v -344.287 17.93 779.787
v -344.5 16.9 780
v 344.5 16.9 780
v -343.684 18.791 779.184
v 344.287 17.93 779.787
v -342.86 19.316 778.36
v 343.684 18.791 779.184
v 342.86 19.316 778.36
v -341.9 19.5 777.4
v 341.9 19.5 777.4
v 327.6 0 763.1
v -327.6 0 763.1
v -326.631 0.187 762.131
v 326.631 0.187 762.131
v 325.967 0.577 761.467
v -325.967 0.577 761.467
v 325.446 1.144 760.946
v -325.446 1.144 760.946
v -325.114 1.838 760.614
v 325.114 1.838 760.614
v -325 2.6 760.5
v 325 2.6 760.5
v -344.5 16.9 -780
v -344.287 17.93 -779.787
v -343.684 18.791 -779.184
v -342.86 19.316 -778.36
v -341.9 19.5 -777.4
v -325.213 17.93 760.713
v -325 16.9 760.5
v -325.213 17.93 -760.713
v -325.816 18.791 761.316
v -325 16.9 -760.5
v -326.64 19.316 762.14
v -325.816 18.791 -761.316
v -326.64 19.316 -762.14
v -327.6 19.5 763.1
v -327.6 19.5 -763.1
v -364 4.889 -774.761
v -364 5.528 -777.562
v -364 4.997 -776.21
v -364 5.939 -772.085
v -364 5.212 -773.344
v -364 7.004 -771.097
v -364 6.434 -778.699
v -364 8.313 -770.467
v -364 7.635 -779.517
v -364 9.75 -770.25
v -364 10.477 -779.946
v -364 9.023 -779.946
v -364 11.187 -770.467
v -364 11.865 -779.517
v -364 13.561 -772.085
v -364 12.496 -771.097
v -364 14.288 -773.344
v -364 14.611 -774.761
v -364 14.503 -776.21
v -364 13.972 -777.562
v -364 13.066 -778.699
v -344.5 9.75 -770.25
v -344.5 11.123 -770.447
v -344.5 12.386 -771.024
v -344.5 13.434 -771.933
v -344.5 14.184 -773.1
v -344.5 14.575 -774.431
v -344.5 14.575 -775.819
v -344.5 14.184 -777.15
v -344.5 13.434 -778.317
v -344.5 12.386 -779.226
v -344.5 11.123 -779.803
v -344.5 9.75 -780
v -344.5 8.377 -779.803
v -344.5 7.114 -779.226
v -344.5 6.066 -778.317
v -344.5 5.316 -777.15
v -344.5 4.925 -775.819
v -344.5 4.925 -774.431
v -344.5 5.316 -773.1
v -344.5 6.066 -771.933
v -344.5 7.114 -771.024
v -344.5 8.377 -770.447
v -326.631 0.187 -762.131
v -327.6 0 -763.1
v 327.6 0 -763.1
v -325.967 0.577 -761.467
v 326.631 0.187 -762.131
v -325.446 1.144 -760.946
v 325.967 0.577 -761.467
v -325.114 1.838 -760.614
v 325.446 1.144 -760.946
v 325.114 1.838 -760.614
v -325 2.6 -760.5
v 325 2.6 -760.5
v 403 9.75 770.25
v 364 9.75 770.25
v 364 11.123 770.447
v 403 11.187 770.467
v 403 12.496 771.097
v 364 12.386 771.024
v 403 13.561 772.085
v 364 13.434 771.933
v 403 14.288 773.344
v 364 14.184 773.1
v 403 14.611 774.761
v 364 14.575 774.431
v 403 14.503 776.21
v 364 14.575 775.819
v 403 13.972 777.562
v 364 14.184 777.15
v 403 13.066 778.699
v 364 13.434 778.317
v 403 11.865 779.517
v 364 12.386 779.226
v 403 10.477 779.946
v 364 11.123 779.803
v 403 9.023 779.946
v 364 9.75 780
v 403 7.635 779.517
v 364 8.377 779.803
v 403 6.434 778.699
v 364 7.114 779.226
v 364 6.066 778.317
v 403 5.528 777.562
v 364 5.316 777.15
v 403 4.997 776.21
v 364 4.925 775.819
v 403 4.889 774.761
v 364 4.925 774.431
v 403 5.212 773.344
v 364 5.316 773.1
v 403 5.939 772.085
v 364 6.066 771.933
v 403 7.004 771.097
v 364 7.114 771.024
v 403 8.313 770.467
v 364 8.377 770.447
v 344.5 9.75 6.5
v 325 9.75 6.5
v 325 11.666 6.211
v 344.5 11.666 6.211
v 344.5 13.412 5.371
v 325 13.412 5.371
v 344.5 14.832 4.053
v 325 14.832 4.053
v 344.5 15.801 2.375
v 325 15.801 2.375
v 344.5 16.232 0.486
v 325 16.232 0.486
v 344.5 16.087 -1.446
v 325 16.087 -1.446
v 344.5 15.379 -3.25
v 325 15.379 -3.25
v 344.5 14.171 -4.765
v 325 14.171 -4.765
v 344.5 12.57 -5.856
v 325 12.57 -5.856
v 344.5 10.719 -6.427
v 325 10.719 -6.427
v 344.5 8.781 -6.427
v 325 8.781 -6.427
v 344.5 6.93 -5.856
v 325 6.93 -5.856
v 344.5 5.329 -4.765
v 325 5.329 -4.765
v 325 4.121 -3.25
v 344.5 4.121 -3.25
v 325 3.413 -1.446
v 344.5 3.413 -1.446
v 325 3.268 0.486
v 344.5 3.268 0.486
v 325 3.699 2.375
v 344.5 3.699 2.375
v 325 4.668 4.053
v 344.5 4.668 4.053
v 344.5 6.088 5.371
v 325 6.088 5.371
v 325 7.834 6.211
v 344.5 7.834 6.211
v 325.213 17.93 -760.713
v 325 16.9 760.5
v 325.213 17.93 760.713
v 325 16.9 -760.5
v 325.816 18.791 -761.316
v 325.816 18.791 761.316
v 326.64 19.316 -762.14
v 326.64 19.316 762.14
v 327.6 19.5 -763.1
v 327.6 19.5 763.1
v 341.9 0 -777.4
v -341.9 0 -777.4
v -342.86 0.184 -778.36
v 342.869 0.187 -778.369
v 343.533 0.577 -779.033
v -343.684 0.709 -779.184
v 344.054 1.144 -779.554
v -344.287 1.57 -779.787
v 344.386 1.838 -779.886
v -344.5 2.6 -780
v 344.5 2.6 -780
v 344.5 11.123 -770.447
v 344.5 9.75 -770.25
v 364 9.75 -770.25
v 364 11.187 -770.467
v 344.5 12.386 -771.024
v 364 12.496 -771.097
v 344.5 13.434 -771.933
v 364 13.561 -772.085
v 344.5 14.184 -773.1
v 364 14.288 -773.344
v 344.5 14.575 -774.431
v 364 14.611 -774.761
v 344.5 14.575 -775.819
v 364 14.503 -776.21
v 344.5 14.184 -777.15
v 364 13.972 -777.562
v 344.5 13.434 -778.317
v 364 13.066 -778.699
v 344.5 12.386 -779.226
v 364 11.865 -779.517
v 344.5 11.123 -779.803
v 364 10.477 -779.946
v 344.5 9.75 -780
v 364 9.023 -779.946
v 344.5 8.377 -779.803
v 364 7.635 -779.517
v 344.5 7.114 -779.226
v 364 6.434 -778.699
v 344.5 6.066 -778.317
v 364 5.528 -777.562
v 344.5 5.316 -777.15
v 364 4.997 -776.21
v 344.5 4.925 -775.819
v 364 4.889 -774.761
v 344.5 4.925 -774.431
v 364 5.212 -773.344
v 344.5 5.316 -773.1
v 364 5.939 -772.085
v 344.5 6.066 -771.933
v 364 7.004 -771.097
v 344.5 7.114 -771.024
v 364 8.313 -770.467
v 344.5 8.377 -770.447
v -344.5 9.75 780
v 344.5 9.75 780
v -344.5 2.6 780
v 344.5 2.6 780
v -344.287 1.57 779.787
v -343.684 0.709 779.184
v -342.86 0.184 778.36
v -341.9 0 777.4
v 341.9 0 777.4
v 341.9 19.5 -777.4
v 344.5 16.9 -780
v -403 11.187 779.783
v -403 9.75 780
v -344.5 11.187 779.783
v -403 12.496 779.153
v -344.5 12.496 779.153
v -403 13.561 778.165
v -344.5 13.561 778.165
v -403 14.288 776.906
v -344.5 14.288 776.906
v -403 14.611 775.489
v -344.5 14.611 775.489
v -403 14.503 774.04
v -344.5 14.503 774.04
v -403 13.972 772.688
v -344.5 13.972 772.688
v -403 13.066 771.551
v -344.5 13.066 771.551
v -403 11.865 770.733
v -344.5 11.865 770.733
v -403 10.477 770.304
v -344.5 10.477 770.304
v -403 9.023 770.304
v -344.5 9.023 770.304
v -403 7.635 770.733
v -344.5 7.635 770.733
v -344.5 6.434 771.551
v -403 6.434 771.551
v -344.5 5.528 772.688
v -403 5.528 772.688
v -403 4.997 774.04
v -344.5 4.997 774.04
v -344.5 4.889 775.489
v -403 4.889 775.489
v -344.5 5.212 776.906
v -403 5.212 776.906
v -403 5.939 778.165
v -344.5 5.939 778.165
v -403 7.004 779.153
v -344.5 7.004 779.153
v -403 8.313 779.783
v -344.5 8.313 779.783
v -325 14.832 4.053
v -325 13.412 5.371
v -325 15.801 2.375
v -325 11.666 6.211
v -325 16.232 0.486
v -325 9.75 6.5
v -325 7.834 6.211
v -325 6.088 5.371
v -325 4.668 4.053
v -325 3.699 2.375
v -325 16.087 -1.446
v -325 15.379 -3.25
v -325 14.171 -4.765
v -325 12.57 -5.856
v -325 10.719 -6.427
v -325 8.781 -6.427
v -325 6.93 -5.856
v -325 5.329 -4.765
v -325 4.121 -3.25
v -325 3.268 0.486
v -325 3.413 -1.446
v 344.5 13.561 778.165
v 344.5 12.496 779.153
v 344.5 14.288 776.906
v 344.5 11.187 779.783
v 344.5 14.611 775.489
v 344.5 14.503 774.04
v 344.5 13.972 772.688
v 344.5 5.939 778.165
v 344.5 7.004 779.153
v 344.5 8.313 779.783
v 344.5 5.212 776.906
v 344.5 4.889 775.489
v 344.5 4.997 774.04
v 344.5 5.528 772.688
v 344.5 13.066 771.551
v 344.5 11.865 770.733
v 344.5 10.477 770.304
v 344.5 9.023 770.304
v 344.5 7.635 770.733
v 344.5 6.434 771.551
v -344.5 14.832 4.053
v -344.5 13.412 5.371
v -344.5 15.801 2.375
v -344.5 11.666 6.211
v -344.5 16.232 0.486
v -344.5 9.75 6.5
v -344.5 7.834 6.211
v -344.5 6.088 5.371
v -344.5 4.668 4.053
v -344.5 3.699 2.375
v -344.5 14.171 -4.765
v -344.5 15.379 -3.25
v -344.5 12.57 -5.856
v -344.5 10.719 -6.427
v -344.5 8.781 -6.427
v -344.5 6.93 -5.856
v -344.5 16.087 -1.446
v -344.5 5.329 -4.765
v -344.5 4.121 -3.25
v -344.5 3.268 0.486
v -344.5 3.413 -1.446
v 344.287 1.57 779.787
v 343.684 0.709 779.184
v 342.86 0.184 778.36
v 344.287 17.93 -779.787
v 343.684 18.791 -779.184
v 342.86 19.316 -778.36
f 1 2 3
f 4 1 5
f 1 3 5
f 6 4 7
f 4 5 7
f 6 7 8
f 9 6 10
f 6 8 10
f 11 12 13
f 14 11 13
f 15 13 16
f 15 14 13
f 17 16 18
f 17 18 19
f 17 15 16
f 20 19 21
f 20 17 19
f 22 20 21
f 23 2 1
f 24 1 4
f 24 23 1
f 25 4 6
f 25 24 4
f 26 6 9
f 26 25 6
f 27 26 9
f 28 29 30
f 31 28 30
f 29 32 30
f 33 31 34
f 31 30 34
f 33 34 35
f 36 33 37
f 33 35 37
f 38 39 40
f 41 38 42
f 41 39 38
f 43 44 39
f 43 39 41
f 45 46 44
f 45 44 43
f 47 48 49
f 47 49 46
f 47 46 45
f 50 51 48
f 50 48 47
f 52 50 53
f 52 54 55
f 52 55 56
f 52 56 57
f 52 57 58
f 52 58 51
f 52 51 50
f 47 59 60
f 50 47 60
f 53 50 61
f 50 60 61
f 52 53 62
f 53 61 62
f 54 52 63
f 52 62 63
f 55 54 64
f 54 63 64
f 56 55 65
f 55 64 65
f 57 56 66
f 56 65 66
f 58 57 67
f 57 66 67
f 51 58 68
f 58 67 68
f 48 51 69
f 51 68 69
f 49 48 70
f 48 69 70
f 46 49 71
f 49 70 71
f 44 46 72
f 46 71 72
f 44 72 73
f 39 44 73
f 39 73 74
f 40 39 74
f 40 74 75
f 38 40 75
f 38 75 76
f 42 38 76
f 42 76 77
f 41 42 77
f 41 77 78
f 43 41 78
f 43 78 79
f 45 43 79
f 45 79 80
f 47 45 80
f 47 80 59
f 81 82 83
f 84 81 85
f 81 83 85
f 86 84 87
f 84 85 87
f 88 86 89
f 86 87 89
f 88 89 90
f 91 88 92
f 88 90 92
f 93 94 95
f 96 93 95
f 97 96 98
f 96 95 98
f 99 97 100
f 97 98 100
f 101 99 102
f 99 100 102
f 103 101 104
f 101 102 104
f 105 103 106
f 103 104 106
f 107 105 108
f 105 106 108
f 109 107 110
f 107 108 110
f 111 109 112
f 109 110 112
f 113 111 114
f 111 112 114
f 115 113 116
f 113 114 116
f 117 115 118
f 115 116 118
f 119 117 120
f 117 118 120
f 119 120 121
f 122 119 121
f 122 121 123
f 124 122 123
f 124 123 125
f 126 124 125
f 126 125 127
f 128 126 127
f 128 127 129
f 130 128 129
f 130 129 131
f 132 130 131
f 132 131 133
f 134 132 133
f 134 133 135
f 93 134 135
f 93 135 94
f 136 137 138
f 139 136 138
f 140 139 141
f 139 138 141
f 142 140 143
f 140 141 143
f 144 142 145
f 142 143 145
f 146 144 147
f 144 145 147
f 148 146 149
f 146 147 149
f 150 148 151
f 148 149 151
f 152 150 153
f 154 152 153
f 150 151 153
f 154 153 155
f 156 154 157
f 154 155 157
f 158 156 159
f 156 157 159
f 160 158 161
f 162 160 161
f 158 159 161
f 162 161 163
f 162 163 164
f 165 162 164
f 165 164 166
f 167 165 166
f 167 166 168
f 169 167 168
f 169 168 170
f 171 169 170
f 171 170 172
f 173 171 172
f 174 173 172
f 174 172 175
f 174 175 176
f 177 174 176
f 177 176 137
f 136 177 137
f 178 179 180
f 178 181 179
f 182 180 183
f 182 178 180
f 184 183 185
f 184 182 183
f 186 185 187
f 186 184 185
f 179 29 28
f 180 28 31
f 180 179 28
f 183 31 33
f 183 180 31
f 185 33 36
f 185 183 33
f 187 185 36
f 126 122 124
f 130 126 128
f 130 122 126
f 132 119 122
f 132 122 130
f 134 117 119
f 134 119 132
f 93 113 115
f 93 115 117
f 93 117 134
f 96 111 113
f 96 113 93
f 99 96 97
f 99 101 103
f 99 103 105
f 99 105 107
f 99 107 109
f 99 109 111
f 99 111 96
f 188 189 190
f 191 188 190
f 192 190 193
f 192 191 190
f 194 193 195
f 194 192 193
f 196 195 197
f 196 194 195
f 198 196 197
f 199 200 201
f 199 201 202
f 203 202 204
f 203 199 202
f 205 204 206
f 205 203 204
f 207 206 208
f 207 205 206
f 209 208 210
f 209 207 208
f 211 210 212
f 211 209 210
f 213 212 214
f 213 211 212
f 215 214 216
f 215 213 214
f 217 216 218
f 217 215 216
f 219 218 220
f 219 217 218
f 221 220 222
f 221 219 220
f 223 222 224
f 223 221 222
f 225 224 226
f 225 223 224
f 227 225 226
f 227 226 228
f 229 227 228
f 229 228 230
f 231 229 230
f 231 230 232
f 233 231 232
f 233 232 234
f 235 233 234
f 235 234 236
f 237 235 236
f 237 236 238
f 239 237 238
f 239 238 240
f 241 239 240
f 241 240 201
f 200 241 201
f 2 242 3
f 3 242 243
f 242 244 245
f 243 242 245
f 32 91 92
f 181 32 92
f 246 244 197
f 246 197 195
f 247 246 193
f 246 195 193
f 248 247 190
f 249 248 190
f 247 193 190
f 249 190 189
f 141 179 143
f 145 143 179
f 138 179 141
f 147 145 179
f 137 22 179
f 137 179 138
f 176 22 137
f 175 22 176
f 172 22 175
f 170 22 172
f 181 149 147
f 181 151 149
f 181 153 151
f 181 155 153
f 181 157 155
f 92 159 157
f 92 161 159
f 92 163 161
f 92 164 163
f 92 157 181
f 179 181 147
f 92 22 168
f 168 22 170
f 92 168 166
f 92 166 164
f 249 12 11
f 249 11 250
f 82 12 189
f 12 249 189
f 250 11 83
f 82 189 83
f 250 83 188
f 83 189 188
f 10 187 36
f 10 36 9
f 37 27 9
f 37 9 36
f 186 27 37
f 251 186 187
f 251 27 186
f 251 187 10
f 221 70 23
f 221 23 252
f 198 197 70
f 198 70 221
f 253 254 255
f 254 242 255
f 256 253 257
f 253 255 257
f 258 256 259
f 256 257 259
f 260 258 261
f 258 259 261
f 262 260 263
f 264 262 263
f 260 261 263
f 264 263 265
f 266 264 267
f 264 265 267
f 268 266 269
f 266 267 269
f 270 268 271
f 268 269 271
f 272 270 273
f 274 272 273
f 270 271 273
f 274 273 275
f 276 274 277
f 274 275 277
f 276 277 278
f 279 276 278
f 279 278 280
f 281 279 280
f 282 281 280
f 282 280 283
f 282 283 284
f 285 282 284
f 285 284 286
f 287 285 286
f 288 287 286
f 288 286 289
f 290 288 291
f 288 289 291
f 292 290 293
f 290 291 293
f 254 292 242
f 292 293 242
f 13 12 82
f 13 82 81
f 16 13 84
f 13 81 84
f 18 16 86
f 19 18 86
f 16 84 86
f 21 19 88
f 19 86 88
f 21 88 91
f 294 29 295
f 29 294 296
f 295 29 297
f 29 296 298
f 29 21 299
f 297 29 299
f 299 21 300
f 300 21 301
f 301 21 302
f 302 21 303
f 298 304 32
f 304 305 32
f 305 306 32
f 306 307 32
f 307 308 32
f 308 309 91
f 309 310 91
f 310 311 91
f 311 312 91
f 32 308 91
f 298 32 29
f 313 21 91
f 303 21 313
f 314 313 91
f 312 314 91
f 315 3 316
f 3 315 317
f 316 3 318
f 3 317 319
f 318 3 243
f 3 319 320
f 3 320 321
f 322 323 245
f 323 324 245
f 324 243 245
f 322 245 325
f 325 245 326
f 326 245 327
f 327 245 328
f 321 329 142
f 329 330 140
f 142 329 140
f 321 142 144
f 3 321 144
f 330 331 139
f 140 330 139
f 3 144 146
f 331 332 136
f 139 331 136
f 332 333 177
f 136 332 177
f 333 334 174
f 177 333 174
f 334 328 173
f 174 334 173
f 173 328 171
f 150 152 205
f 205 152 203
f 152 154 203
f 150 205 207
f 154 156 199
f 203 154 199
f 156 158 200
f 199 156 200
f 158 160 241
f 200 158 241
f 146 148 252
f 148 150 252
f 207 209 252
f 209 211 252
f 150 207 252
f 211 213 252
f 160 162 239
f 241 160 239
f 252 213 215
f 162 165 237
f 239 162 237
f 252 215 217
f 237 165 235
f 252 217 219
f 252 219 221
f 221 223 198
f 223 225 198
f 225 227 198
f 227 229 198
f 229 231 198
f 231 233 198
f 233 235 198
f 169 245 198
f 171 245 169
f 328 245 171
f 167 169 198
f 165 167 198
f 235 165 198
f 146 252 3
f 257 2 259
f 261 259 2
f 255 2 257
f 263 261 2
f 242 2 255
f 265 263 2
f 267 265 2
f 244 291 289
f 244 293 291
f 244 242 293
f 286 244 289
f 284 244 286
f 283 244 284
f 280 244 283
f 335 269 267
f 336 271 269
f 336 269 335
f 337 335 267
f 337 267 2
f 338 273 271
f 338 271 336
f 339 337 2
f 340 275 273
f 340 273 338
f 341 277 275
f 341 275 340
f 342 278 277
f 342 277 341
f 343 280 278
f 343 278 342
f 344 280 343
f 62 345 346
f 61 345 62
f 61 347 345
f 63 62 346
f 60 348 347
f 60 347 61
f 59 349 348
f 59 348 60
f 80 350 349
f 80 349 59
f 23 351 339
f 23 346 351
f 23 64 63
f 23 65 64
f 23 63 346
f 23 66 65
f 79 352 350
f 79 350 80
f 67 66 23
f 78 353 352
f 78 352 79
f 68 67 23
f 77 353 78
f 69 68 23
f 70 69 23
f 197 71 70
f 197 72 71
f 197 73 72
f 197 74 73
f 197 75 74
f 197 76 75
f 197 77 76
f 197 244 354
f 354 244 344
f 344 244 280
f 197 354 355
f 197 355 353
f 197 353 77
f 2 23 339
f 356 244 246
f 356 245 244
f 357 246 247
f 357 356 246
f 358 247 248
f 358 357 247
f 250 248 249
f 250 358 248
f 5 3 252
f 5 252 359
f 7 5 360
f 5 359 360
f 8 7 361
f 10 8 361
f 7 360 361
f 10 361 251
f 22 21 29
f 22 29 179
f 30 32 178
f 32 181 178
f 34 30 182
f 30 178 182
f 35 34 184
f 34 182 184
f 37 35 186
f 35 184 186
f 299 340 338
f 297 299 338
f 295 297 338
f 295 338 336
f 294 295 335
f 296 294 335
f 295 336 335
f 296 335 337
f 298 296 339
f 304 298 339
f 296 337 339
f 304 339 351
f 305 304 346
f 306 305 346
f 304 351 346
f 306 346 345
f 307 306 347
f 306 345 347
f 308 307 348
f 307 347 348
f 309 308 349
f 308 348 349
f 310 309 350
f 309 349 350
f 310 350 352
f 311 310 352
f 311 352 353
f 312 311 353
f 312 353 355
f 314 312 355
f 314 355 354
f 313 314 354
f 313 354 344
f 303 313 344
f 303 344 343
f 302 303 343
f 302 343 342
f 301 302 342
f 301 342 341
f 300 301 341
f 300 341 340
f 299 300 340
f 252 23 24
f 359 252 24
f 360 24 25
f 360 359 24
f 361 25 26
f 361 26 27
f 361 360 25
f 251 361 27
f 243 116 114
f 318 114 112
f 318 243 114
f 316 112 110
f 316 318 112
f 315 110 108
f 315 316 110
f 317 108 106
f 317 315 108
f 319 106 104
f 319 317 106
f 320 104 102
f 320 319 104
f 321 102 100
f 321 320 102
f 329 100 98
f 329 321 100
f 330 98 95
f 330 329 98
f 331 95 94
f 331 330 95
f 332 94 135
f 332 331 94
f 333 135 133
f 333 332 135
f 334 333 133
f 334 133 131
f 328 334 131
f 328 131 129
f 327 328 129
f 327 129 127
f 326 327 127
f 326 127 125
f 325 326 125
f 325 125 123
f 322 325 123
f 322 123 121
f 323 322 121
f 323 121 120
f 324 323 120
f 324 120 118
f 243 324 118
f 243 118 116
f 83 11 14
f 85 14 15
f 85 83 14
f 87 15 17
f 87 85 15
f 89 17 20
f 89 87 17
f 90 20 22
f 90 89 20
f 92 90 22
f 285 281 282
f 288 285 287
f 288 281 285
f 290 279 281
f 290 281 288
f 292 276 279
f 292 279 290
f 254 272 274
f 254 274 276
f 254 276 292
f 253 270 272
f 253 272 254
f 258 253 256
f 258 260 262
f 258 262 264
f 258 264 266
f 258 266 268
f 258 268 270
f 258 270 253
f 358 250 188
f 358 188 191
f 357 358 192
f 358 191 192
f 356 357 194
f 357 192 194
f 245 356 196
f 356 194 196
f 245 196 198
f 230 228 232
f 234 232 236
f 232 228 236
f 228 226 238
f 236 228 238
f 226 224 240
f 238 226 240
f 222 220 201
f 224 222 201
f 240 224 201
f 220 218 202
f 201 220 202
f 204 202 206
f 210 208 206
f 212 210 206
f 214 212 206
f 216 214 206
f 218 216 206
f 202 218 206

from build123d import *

# Parameters (mm, degrees)
CROQUIS1_W              = 530
CROQUIS1_H              = 1200
CROQUIS1_W_2            = 500
CROQUIS1_H_2            = 1170
SALIENTE_EXTRUIR1_DEPTH = 15
REDONDEO1_R             = 2
REDONDEO2_R             = 2
CROQUIS2_R              = 3.75
SALIENTE_EXTRUIR2_DEPTH = 15
CROQUIS3_R              = 5
CORTAR_EXTRUIR1_DEPTH   = 546
CROQUIS4_R              = 3.75
SALIENTE_EXTRUIR3_DEPTH = 30
CROQUIS5_R              = 3.75
SALIENTE_EXTRUIR4_DEPTH = 30
ESCALA1_SCALE           = 1.3


with BuildPart() as part:
    # Croquis1 → Saliente-Extruir1 (new body)
    with BuildSketch(Plane(origin=(0, 0, 0), x_dir=(1, 0, 0), z_dir=(0, 1, 0))):
        Rectangle(CROQUIS1_W, CROQUIS1_H)
        Rectangle(CROQUIS1_W_2, CROQUIS1_H_2, mode=Mode.SUBTRACT)
    extrude(amount=SALIENTE_EXTRUIR1_DEPTH)

    # Redondeo1
    redondeo1_edges = [part.edges().sort_by_distance(p)[0] for p in [
        (-265, 15, 0),
        (250, 15, 0),
        (0, 15, 600),
        (0, 15, -585),
        (-250, 15, 0),
        (0, 15, 585),
        (265, 15, 0),
        (0, 15, -600),
    ]]
    fillet(redondeo1_edges, radius=REDONDEO1_R)

    # Redondeo2
    redondeo2_edges = [part.edges().sort_by_distance(p)[0] for p in [
        (250, 0, 0),
        (0, 0, -585),
        (-250, 0, 0),
        (0, 0, 585),
        (0, 0, 600),
        (-265, 0, 0),
        (0, 0, -600),
        (265, 0, 0),
    ]]
    fillet(redondeo2_edges, radius=REDONDEO2_R)

    # Croquis2 → Saliente-Extruir2 (add)
    with BuildSketch(Plane.ZY.offset(265)):
        with Locations((596.25, 7.5)):
            Circle(CROQUIS2_R)
        with Locations((-596.25, 7.5)):
            Circle(CROQUIS2_R)
    saliente_extruir2 = extrude(amount=SALIENTE_EXTRUIR2_DEPTH)

    # Simetría1: Saliente-Extruir2 across plane
    add(saliente_extruir2.mirror(Plane(origin=(0, 0, 0), x_dir=(0, 0, 1), z_dir=(1, 0, 0))))

    # Croquis3 → Cortar-Extruir1 (cut, through all)
    with BuildSketch(Plane.ZY.offset(265)):
        with Locations((0, 7.5)):
            Circle(CROQUIS3_R)
    extrude(amount=-CORTAR_EXTRUIR1_DEPTH, mode=Mode.SUBTRACT)

    # Croquis4 → Saliente-Extruir3 (add)
    with BuildSketch(Plane(origin=(280, 0, 0), x_dir=(0, 0, -1), z_dir=(1, 0, 0))):
        with Locations((-596.25, 7.5)):
            Circle(CROQUIS4_R)
    extrude(amount=SALIENTE_EXTRUIR3_DEPTH)

    # Croquis5 → Saliente-Extruir4 (add)
    with BuildSketch(Plane.ZY.offset(280)):
        with Locations((596.25, 7.5)):
            Circle(CROQUIS5_R)
    extrude(amount=SALIENTE_EXTRUIR4_DEPTH)


with BuildPart() as part_1:
    # Escala1: scaled about (0, 0, 0)
    add(part.part.scale(ESCALA1_SCALE))


solid = part_1.part
